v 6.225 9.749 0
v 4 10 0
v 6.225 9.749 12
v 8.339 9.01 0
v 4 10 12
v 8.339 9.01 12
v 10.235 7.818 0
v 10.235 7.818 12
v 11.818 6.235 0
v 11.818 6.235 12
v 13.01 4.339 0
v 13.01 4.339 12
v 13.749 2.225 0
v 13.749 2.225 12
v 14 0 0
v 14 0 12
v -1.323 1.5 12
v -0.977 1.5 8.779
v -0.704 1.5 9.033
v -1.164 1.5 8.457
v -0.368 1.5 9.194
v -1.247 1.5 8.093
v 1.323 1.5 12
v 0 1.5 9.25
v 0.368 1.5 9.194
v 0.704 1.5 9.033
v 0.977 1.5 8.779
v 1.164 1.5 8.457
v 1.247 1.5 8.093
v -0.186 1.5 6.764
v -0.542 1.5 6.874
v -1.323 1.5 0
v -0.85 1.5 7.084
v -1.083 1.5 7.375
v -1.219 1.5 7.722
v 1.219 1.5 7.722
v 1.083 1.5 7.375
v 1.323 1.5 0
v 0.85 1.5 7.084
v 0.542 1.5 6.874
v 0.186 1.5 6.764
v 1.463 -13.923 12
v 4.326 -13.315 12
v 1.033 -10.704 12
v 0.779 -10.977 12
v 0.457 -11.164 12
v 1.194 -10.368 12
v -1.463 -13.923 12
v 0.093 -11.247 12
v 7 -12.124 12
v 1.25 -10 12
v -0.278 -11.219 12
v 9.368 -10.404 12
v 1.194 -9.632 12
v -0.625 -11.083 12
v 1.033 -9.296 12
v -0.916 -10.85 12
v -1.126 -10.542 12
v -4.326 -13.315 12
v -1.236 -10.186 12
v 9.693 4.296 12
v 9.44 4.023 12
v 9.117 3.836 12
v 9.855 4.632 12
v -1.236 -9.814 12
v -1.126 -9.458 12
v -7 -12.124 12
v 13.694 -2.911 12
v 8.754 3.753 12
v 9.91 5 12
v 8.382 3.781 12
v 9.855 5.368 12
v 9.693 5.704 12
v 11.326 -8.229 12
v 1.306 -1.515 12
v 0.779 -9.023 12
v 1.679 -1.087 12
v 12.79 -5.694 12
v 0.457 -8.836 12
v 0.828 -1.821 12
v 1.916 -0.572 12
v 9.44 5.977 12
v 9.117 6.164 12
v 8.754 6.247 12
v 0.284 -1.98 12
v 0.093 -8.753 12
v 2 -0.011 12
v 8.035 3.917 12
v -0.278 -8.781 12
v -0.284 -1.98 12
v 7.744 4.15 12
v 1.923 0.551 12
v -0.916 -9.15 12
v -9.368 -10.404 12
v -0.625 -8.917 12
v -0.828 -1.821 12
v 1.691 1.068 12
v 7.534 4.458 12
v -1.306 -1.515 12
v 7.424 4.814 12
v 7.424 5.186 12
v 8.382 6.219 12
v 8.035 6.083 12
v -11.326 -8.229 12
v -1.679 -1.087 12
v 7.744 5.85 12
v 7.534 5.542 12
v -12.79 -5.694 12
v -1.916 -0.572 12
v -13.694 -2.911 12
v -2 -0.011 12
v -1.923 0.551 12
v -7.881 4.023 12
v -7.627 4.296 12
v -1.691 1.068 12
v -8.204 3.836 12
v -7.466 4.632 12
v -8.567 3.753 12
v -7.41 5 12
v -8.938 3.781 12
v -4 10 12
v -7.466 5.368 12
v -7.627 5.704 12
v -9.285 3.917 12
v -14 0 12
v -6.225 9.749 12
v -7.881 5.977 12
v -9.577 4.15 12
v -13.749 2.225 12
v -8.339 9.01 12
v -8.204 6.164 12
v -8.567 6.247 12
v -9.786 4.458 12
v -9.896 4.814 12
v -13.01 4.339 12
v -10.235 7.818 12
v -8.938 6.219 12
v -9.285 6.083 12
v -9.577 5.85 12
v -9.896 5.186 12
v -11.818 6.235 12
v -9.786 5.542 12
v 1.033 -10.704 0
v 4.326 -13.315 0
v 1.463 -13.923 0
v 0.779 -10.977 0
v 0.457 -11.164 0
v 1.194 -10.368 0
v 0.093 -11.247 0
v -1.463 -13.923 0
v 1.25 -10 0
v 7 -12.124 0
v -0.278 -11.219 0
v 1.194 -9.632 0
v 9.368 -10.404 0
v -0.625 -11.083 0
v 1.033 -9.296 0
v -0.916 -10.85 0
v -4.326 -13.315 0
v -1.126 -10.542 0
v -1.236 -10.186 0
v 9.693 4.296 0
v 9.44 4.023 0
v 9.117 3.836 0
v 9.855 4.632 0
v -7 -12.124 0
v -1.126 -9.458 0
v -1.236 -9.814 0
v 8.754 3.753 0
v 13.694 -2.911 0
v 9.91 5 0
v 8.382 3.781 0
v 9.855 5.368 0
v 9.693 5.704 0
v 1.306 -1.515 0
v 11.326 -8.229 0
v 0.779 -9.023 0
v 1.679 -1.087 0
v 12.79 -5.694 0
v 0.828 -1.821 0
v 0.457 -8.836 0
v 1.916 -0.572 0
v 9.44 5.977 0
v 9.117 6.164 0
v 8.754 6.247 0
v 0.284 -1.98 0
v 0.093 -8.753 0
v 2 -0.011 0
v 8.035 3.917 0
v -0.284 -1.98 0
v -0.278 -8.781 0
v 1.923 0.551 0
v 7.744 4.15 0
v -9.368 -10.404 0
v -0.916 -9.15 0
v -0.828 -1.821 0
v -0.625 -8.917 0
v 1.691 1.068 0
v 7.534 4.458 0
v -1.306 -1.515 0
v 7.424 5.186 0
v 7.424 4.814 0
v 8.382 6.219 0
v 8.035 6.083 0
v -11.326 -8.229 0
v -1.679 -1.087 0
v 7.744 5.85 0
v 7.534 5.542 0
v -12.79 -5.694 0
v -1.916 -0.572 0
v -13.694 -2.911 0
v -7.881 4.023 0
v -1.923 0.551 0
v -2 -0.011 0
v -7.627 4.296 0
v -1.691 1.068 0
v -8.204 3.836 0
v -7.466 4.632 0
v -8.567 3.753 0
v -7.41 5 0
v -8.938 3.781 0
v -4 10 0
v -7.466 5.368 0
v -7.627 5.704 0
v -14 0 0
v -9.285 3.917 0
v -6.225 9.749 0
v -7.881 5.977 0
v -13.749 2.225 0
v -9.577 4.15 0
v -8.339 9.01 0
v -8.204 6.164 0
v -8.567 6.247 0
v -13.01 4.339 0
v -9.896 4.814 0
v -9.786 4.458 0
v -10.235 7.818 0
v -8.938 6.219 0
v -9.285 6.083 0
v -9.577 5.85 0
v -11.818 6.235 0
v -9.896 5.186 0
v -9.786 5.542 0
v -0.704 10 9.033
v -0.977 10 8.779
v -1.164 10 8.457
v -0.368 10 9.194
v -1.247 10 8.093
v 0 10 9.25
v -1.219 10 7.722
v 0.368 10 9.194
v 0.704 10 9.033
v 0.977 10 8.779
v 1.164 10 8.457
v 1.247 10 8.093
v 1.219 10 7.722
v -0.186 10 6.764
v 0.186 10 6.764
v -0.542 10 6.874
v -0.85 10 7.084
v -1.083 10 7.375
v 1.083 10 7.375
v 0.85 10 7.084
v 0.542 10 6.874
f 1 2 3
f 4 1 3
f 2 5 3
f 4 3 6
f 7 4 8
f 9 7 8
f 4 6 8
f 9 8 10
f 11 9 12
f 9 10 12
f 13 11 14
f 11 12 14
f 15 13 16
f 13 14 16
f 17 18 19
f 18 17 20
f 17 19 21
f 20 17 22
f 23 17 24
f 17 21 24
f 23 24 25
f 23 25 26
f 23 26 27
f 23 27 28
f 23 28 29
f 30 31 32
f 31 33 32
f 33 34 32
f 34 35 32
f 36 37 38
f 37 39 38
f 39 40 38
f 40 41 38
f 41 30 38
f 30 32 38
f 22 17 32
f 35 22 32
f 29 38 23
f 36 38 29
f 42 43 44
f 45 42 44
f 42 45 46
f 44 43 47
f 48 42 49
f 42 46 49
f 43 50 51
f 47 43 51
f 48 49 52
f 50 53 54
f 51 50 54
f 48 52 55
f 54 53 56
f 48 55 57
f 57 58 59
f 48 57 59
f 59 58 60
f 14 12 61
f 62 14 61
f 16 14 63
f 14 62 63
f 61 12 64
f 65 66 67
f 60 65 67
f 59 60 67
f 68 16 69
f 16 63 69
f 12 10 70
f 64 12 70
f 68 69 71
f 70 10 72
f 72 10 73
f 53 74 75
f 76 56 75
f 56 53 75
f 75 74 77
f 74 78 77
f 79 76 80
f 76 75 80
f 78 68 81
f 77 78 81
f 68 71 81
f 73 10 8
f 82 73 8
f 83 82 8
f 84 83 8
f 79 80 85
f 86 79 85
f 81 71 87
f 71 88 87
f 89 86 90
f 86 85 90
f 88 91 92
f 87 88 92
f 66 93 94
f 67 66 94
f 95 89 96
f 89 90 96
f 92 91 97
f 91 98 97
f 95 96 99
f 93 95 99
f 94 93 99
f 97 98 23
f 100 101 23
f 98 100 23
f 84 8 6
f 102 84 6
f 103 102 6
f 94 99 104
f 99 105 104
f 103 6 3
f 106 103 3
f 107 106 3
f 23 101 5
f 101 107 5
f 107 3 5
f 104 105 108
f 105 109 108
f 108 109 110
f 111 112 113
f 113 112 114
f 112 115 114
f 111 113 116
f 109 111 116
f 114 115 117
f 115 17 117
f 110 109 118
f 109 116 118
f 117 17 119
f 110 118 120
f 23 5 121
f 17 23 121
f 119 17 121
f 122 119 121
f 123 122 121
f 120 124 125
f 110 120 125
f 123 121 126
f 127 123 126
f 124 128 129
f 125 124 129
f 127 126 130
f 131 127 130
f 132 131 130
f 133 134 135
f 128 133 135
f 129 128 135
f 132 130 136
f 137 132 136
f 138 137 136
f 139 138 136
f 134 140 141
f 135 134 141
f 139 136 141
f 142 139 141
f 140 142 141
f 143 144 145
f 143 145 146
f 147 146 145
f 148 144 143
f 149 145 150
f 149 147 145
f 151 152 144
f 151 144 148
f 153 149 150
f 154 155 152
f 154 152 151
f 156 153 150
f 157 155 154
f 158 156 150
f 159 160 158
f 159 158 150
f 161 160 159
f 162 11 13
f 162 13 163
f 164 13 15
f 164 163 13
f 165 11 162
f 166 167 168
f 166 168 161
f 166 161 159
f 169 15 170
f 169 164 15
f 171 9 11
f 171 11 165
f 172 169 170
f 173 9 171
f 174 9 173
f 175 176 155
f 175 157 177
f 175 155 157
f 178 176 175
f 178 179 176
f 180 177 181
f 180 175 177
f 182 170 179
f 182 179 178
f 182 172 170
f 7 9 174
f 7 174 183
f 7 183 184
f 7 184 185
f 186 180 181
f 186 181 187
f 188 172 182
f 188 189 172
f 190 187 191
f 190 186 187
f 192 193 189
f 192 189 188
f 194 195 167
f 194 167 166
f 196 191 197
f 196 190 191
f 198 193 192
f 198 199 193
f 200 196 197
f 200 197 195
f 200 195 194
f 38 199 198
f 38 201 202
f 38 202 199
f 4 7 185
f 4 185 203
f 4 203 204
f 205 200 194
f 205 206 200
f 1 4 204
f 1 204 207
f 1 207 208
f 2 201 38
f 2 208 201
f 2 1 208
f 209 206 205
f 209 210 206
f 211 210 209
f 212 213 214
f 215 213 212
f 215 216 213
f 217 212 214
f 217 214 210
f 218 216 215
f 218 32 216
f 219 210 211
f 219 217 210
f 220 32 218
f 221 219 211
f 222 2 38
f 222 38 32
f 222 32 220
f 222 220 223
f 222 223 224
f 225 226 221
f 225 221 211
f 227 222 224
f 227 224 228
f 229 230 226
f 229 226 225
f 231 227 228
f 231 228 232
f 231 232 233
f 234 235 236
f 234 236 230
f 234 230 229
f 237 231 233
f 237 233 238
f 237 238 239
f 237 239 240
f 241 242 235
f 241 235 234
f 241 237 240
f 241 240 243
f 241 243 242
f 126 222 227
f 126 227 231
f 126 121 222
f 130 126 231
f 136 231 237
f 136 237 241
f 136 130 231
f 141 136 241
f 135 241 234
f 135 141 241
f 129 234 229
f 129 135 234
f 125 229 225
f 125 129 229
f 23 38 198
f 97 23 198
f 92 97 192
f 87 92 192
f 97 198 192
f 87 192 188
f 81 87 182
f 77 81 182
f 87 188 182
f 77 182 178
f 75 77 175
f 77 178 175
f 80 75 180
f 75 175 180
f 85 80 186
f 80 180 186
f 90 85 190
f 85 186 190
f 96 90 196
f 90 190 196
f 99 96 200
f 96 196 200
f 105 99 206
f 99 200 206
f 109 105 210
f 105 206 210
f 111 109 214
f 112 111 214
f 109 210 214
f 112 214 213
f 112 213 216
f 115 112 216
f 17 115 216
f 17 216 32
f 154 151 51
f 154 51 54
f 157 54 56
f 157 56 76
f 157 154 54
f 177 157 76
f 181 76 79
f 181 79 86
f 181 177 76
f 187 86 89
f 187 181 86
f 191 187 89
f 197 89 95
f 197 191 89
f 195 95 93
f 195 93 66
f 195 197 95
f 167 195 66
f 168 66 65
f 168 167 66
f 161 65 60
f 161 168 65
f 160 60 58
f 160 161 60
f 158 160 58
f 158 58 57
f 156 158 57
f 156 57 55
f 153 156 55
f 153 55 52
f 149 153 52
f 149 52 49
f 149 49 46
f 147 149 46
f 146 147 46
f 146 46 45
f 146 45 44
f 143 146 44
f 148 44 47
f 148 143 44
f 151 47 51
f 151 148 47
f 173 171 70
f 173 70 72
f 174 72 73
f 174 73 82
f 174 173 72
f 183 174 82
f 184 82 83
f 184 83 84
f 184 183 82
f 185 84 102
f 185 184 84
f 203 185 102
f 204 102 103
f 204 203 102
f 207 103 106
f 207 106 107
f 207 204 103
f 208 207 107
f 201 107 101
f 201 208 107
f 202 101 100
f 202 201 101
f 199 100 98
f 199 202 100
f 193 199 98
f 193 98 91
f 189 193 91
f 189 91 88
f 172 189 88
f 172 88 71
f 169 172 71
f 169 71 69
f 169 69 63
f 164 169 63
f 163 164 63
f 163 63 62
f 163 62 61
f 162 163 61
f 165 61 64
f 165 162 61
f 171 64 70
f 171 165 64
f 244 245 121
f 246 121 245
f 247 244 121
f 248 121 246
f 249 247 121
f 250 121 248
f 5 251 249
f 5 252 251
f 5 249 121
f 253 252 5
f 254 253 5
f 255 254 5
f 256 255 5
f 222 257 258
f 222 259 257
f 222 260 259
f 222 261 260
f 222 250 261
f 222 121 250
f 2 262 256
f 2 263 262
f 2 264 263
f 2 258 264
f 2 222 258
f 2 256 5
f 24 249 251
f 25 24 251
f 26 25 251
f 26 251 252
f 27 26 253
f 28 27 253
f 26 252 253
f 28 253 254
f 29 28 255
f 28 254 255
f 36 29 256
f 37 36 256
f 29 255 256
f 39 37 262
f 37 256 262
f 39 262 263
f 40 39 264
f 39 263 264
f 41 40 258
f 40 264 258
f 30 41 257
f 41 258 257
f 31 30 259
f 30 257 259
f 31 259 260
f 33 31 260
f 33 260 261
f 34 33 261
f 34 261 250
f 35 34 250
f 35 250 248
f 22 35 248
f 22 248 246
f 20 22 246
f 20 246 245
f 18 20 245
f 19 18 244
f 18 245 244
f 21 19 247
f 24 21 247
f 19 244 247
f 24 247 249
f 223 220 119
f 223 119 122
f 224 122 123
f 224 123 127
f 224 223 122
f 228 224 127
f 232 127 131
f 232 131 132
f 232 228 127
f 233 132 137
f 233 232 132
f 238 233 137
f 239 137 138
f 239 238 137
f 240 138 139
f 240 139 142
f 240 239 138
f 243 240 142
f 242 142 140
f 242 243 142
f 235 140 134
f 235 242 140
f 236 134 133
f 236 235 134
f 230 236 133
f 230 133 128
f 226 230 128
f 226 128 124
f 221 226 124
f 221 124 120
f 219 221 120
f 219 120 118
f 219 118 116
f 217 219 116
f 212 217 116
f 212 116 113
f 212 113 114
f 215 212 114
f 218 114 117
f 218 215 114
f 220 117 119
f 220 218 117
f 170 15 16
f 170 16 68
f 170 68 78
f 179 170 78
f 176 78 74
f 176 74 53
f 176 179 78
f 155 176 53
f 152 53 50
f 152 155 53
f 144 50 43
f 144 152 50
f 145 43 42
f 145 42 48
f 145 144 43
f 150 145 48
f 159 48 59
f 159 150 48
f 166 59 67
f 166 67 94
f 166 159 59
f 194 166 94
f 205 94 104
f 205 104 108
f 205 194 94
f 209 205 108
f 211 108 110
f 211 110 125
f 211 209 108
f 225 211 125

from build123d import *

# Parameters (mm, degrees)
SKETCH_1_R          = 1.25
EXTRUDE_1_DEPTH     = 12
SKETCH_3_R          = 1.25
CUT_EXTRUDE_1_DEPTH = 8.5
FILLET_1_R          = 10


with BuildPart() as part:
    # ｽｹｯﾁ1 → ﾎﾞｽ - 押し出し1 (new body)
    with BuildSketch(Plane.XY):
        with BuildLine():
            Line((-9.797958971, 10), (9.797958971, 10))
            ThreePointArc((9.797958971, 10), (0, -14), (-9.797958971, 10))
        make_face()
        with Locations((-8.660254038, 5)):
            Circle(SKETCH_1_R, mode=Mode.SUBTRACT)
        with Locations((8.660254038, 5)):
            Circle(SKETCH_1_R, mode=Mode.SUBTRACT)
        with Locations((0, -10)):
            Circle(SKETCH_1_R, mode=Mode.SUBTRACT)
        with BuildLine():
            Line((-1.322875656, 1.5), (1.322875656, 1.5))
            ThreePointArc((1.322875656, 1.5), (0, -2), (-1.322875656, 1.5))
        make_face(mode=Mode.SUBTRACT)
    extrude(amount=EXTRUDE_1_DEPTH)

    # ｽｹｯﾁ3 → ｶｯﾄ - 押し出し1 (cut)
    with BuildSketch(Plane(origin=(0, 10, 0), x_dir=(1, 0, 0), z_dir=(0, 1, 0))):
        with Locations(Location((0, -8, 0), (0, 0, 270))):
            Circle(SKETCH_3_R)
    extrude(amount=-CUT_EXTRUDE_1_DEPTH, mode=Mode.SUBTRACT)

    # ﾌｨﾚｯﾄ1
    fillet_1_edges = [part.edges().sort_by_distance(p)[0] for p in [
        (-9.797958971, 10, 6),
        (9.797958971, 10, 6),
    ]]
    fillet(fillet_1_edges, radius=FILLET_1_R)


solid = part.part
